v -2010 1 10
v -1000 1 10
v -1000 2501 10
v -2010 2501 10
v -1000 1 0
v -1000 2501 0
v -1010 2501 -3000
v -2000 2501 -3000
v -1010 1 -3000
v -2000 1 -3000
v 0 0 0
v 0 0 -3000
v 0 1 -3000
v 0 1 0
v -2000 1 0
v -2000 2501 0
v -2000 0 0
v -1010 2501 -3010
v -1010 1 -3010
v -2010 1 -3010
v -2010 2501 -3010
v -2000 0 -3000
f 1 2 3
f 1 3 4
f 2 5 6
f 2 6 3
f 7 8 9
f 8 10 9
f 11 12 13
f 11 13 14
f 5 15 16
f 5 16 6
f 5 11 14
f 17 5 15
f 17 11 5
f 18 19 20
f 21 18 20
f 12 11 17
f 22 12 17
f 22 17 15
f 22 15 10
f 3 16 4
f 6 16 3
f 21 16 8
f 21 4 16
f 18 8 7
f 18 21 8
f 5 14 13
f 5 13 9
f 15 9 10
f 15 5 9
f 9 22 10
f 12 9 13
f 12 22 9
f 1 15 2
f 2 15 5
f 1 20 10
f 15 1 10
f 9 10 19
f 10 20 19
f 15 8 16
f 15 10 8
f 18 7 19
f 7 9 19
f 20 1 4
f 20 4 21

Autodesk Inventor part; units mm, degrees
ref_plane "YZ Plane" through (0, 0, 0) normal (1, 0, 0) x (0, 1, 0)
ref_plane "XZ Plane" through (0, 0, 0) normal (0, 1, 0) x (-1, 0, 0)
ref_plane "XY Plane" through (0, 0, 0) normal (0, 0, 1) x (1, 0, 0)
sketch "Sketch1" plane through (0, 0, 0) normal (0, 1, 0) x (-1, 0, 0)
  line L0 (0, 0) -> (2000, 0)
  line L1 (2000, 0) -> (2000, -3000)
  line L2 (2000, -3000) -> (0, -3000)
  line L3 (0, -3000) -> (0, 0)
  dimension "d2" = 2000
  dimension "d3" = 3000
extrude "Extrusion2" add sketch "Sketch1" along normal blind 1
sketch "Sketch3" plane through (0, 1, 0) normal (0, 1, 0) x (1, 0, 0)
  line L0 (-2000, 0) -> (0, 0) projected
  line L1 (-2000, 0) -> (-1000, 0)
  line L2 (-1000, 0) -> (-1000, -10)
  line L3 (-1000, -10) -> (-2000, -10)
  line L4 (-2000, -10) -> (-2000, 0)
  line L5 (-2000, -10) -> (-2010, -10)
  line L6 (-2010, -10) -> (-2010, 3000)
  line L7 (-2010, 3000) -> (-2000, 3000)
  line L8 (-2000, 3000) -> (-2000, -10)
  line L9 (-2010, 3000) -> (-1010, 3000)
  line L10 (-1010, 3000) -> (-1010, 3010)
  line L11 (-1010, 3010) -> (-2010, 3010)
  line L12 (-2010, 3010) -> (-2010, 3000)
  dimension "d6" = 10
  dimension "d7" = 10
  dimension "d8" = 1000
  dimension "d9" = 1000
  dimension "d10" = 10
extrude "Extrusion3" add sketch "Sketch3" along normal blind 2500
properties part number "Monter"
